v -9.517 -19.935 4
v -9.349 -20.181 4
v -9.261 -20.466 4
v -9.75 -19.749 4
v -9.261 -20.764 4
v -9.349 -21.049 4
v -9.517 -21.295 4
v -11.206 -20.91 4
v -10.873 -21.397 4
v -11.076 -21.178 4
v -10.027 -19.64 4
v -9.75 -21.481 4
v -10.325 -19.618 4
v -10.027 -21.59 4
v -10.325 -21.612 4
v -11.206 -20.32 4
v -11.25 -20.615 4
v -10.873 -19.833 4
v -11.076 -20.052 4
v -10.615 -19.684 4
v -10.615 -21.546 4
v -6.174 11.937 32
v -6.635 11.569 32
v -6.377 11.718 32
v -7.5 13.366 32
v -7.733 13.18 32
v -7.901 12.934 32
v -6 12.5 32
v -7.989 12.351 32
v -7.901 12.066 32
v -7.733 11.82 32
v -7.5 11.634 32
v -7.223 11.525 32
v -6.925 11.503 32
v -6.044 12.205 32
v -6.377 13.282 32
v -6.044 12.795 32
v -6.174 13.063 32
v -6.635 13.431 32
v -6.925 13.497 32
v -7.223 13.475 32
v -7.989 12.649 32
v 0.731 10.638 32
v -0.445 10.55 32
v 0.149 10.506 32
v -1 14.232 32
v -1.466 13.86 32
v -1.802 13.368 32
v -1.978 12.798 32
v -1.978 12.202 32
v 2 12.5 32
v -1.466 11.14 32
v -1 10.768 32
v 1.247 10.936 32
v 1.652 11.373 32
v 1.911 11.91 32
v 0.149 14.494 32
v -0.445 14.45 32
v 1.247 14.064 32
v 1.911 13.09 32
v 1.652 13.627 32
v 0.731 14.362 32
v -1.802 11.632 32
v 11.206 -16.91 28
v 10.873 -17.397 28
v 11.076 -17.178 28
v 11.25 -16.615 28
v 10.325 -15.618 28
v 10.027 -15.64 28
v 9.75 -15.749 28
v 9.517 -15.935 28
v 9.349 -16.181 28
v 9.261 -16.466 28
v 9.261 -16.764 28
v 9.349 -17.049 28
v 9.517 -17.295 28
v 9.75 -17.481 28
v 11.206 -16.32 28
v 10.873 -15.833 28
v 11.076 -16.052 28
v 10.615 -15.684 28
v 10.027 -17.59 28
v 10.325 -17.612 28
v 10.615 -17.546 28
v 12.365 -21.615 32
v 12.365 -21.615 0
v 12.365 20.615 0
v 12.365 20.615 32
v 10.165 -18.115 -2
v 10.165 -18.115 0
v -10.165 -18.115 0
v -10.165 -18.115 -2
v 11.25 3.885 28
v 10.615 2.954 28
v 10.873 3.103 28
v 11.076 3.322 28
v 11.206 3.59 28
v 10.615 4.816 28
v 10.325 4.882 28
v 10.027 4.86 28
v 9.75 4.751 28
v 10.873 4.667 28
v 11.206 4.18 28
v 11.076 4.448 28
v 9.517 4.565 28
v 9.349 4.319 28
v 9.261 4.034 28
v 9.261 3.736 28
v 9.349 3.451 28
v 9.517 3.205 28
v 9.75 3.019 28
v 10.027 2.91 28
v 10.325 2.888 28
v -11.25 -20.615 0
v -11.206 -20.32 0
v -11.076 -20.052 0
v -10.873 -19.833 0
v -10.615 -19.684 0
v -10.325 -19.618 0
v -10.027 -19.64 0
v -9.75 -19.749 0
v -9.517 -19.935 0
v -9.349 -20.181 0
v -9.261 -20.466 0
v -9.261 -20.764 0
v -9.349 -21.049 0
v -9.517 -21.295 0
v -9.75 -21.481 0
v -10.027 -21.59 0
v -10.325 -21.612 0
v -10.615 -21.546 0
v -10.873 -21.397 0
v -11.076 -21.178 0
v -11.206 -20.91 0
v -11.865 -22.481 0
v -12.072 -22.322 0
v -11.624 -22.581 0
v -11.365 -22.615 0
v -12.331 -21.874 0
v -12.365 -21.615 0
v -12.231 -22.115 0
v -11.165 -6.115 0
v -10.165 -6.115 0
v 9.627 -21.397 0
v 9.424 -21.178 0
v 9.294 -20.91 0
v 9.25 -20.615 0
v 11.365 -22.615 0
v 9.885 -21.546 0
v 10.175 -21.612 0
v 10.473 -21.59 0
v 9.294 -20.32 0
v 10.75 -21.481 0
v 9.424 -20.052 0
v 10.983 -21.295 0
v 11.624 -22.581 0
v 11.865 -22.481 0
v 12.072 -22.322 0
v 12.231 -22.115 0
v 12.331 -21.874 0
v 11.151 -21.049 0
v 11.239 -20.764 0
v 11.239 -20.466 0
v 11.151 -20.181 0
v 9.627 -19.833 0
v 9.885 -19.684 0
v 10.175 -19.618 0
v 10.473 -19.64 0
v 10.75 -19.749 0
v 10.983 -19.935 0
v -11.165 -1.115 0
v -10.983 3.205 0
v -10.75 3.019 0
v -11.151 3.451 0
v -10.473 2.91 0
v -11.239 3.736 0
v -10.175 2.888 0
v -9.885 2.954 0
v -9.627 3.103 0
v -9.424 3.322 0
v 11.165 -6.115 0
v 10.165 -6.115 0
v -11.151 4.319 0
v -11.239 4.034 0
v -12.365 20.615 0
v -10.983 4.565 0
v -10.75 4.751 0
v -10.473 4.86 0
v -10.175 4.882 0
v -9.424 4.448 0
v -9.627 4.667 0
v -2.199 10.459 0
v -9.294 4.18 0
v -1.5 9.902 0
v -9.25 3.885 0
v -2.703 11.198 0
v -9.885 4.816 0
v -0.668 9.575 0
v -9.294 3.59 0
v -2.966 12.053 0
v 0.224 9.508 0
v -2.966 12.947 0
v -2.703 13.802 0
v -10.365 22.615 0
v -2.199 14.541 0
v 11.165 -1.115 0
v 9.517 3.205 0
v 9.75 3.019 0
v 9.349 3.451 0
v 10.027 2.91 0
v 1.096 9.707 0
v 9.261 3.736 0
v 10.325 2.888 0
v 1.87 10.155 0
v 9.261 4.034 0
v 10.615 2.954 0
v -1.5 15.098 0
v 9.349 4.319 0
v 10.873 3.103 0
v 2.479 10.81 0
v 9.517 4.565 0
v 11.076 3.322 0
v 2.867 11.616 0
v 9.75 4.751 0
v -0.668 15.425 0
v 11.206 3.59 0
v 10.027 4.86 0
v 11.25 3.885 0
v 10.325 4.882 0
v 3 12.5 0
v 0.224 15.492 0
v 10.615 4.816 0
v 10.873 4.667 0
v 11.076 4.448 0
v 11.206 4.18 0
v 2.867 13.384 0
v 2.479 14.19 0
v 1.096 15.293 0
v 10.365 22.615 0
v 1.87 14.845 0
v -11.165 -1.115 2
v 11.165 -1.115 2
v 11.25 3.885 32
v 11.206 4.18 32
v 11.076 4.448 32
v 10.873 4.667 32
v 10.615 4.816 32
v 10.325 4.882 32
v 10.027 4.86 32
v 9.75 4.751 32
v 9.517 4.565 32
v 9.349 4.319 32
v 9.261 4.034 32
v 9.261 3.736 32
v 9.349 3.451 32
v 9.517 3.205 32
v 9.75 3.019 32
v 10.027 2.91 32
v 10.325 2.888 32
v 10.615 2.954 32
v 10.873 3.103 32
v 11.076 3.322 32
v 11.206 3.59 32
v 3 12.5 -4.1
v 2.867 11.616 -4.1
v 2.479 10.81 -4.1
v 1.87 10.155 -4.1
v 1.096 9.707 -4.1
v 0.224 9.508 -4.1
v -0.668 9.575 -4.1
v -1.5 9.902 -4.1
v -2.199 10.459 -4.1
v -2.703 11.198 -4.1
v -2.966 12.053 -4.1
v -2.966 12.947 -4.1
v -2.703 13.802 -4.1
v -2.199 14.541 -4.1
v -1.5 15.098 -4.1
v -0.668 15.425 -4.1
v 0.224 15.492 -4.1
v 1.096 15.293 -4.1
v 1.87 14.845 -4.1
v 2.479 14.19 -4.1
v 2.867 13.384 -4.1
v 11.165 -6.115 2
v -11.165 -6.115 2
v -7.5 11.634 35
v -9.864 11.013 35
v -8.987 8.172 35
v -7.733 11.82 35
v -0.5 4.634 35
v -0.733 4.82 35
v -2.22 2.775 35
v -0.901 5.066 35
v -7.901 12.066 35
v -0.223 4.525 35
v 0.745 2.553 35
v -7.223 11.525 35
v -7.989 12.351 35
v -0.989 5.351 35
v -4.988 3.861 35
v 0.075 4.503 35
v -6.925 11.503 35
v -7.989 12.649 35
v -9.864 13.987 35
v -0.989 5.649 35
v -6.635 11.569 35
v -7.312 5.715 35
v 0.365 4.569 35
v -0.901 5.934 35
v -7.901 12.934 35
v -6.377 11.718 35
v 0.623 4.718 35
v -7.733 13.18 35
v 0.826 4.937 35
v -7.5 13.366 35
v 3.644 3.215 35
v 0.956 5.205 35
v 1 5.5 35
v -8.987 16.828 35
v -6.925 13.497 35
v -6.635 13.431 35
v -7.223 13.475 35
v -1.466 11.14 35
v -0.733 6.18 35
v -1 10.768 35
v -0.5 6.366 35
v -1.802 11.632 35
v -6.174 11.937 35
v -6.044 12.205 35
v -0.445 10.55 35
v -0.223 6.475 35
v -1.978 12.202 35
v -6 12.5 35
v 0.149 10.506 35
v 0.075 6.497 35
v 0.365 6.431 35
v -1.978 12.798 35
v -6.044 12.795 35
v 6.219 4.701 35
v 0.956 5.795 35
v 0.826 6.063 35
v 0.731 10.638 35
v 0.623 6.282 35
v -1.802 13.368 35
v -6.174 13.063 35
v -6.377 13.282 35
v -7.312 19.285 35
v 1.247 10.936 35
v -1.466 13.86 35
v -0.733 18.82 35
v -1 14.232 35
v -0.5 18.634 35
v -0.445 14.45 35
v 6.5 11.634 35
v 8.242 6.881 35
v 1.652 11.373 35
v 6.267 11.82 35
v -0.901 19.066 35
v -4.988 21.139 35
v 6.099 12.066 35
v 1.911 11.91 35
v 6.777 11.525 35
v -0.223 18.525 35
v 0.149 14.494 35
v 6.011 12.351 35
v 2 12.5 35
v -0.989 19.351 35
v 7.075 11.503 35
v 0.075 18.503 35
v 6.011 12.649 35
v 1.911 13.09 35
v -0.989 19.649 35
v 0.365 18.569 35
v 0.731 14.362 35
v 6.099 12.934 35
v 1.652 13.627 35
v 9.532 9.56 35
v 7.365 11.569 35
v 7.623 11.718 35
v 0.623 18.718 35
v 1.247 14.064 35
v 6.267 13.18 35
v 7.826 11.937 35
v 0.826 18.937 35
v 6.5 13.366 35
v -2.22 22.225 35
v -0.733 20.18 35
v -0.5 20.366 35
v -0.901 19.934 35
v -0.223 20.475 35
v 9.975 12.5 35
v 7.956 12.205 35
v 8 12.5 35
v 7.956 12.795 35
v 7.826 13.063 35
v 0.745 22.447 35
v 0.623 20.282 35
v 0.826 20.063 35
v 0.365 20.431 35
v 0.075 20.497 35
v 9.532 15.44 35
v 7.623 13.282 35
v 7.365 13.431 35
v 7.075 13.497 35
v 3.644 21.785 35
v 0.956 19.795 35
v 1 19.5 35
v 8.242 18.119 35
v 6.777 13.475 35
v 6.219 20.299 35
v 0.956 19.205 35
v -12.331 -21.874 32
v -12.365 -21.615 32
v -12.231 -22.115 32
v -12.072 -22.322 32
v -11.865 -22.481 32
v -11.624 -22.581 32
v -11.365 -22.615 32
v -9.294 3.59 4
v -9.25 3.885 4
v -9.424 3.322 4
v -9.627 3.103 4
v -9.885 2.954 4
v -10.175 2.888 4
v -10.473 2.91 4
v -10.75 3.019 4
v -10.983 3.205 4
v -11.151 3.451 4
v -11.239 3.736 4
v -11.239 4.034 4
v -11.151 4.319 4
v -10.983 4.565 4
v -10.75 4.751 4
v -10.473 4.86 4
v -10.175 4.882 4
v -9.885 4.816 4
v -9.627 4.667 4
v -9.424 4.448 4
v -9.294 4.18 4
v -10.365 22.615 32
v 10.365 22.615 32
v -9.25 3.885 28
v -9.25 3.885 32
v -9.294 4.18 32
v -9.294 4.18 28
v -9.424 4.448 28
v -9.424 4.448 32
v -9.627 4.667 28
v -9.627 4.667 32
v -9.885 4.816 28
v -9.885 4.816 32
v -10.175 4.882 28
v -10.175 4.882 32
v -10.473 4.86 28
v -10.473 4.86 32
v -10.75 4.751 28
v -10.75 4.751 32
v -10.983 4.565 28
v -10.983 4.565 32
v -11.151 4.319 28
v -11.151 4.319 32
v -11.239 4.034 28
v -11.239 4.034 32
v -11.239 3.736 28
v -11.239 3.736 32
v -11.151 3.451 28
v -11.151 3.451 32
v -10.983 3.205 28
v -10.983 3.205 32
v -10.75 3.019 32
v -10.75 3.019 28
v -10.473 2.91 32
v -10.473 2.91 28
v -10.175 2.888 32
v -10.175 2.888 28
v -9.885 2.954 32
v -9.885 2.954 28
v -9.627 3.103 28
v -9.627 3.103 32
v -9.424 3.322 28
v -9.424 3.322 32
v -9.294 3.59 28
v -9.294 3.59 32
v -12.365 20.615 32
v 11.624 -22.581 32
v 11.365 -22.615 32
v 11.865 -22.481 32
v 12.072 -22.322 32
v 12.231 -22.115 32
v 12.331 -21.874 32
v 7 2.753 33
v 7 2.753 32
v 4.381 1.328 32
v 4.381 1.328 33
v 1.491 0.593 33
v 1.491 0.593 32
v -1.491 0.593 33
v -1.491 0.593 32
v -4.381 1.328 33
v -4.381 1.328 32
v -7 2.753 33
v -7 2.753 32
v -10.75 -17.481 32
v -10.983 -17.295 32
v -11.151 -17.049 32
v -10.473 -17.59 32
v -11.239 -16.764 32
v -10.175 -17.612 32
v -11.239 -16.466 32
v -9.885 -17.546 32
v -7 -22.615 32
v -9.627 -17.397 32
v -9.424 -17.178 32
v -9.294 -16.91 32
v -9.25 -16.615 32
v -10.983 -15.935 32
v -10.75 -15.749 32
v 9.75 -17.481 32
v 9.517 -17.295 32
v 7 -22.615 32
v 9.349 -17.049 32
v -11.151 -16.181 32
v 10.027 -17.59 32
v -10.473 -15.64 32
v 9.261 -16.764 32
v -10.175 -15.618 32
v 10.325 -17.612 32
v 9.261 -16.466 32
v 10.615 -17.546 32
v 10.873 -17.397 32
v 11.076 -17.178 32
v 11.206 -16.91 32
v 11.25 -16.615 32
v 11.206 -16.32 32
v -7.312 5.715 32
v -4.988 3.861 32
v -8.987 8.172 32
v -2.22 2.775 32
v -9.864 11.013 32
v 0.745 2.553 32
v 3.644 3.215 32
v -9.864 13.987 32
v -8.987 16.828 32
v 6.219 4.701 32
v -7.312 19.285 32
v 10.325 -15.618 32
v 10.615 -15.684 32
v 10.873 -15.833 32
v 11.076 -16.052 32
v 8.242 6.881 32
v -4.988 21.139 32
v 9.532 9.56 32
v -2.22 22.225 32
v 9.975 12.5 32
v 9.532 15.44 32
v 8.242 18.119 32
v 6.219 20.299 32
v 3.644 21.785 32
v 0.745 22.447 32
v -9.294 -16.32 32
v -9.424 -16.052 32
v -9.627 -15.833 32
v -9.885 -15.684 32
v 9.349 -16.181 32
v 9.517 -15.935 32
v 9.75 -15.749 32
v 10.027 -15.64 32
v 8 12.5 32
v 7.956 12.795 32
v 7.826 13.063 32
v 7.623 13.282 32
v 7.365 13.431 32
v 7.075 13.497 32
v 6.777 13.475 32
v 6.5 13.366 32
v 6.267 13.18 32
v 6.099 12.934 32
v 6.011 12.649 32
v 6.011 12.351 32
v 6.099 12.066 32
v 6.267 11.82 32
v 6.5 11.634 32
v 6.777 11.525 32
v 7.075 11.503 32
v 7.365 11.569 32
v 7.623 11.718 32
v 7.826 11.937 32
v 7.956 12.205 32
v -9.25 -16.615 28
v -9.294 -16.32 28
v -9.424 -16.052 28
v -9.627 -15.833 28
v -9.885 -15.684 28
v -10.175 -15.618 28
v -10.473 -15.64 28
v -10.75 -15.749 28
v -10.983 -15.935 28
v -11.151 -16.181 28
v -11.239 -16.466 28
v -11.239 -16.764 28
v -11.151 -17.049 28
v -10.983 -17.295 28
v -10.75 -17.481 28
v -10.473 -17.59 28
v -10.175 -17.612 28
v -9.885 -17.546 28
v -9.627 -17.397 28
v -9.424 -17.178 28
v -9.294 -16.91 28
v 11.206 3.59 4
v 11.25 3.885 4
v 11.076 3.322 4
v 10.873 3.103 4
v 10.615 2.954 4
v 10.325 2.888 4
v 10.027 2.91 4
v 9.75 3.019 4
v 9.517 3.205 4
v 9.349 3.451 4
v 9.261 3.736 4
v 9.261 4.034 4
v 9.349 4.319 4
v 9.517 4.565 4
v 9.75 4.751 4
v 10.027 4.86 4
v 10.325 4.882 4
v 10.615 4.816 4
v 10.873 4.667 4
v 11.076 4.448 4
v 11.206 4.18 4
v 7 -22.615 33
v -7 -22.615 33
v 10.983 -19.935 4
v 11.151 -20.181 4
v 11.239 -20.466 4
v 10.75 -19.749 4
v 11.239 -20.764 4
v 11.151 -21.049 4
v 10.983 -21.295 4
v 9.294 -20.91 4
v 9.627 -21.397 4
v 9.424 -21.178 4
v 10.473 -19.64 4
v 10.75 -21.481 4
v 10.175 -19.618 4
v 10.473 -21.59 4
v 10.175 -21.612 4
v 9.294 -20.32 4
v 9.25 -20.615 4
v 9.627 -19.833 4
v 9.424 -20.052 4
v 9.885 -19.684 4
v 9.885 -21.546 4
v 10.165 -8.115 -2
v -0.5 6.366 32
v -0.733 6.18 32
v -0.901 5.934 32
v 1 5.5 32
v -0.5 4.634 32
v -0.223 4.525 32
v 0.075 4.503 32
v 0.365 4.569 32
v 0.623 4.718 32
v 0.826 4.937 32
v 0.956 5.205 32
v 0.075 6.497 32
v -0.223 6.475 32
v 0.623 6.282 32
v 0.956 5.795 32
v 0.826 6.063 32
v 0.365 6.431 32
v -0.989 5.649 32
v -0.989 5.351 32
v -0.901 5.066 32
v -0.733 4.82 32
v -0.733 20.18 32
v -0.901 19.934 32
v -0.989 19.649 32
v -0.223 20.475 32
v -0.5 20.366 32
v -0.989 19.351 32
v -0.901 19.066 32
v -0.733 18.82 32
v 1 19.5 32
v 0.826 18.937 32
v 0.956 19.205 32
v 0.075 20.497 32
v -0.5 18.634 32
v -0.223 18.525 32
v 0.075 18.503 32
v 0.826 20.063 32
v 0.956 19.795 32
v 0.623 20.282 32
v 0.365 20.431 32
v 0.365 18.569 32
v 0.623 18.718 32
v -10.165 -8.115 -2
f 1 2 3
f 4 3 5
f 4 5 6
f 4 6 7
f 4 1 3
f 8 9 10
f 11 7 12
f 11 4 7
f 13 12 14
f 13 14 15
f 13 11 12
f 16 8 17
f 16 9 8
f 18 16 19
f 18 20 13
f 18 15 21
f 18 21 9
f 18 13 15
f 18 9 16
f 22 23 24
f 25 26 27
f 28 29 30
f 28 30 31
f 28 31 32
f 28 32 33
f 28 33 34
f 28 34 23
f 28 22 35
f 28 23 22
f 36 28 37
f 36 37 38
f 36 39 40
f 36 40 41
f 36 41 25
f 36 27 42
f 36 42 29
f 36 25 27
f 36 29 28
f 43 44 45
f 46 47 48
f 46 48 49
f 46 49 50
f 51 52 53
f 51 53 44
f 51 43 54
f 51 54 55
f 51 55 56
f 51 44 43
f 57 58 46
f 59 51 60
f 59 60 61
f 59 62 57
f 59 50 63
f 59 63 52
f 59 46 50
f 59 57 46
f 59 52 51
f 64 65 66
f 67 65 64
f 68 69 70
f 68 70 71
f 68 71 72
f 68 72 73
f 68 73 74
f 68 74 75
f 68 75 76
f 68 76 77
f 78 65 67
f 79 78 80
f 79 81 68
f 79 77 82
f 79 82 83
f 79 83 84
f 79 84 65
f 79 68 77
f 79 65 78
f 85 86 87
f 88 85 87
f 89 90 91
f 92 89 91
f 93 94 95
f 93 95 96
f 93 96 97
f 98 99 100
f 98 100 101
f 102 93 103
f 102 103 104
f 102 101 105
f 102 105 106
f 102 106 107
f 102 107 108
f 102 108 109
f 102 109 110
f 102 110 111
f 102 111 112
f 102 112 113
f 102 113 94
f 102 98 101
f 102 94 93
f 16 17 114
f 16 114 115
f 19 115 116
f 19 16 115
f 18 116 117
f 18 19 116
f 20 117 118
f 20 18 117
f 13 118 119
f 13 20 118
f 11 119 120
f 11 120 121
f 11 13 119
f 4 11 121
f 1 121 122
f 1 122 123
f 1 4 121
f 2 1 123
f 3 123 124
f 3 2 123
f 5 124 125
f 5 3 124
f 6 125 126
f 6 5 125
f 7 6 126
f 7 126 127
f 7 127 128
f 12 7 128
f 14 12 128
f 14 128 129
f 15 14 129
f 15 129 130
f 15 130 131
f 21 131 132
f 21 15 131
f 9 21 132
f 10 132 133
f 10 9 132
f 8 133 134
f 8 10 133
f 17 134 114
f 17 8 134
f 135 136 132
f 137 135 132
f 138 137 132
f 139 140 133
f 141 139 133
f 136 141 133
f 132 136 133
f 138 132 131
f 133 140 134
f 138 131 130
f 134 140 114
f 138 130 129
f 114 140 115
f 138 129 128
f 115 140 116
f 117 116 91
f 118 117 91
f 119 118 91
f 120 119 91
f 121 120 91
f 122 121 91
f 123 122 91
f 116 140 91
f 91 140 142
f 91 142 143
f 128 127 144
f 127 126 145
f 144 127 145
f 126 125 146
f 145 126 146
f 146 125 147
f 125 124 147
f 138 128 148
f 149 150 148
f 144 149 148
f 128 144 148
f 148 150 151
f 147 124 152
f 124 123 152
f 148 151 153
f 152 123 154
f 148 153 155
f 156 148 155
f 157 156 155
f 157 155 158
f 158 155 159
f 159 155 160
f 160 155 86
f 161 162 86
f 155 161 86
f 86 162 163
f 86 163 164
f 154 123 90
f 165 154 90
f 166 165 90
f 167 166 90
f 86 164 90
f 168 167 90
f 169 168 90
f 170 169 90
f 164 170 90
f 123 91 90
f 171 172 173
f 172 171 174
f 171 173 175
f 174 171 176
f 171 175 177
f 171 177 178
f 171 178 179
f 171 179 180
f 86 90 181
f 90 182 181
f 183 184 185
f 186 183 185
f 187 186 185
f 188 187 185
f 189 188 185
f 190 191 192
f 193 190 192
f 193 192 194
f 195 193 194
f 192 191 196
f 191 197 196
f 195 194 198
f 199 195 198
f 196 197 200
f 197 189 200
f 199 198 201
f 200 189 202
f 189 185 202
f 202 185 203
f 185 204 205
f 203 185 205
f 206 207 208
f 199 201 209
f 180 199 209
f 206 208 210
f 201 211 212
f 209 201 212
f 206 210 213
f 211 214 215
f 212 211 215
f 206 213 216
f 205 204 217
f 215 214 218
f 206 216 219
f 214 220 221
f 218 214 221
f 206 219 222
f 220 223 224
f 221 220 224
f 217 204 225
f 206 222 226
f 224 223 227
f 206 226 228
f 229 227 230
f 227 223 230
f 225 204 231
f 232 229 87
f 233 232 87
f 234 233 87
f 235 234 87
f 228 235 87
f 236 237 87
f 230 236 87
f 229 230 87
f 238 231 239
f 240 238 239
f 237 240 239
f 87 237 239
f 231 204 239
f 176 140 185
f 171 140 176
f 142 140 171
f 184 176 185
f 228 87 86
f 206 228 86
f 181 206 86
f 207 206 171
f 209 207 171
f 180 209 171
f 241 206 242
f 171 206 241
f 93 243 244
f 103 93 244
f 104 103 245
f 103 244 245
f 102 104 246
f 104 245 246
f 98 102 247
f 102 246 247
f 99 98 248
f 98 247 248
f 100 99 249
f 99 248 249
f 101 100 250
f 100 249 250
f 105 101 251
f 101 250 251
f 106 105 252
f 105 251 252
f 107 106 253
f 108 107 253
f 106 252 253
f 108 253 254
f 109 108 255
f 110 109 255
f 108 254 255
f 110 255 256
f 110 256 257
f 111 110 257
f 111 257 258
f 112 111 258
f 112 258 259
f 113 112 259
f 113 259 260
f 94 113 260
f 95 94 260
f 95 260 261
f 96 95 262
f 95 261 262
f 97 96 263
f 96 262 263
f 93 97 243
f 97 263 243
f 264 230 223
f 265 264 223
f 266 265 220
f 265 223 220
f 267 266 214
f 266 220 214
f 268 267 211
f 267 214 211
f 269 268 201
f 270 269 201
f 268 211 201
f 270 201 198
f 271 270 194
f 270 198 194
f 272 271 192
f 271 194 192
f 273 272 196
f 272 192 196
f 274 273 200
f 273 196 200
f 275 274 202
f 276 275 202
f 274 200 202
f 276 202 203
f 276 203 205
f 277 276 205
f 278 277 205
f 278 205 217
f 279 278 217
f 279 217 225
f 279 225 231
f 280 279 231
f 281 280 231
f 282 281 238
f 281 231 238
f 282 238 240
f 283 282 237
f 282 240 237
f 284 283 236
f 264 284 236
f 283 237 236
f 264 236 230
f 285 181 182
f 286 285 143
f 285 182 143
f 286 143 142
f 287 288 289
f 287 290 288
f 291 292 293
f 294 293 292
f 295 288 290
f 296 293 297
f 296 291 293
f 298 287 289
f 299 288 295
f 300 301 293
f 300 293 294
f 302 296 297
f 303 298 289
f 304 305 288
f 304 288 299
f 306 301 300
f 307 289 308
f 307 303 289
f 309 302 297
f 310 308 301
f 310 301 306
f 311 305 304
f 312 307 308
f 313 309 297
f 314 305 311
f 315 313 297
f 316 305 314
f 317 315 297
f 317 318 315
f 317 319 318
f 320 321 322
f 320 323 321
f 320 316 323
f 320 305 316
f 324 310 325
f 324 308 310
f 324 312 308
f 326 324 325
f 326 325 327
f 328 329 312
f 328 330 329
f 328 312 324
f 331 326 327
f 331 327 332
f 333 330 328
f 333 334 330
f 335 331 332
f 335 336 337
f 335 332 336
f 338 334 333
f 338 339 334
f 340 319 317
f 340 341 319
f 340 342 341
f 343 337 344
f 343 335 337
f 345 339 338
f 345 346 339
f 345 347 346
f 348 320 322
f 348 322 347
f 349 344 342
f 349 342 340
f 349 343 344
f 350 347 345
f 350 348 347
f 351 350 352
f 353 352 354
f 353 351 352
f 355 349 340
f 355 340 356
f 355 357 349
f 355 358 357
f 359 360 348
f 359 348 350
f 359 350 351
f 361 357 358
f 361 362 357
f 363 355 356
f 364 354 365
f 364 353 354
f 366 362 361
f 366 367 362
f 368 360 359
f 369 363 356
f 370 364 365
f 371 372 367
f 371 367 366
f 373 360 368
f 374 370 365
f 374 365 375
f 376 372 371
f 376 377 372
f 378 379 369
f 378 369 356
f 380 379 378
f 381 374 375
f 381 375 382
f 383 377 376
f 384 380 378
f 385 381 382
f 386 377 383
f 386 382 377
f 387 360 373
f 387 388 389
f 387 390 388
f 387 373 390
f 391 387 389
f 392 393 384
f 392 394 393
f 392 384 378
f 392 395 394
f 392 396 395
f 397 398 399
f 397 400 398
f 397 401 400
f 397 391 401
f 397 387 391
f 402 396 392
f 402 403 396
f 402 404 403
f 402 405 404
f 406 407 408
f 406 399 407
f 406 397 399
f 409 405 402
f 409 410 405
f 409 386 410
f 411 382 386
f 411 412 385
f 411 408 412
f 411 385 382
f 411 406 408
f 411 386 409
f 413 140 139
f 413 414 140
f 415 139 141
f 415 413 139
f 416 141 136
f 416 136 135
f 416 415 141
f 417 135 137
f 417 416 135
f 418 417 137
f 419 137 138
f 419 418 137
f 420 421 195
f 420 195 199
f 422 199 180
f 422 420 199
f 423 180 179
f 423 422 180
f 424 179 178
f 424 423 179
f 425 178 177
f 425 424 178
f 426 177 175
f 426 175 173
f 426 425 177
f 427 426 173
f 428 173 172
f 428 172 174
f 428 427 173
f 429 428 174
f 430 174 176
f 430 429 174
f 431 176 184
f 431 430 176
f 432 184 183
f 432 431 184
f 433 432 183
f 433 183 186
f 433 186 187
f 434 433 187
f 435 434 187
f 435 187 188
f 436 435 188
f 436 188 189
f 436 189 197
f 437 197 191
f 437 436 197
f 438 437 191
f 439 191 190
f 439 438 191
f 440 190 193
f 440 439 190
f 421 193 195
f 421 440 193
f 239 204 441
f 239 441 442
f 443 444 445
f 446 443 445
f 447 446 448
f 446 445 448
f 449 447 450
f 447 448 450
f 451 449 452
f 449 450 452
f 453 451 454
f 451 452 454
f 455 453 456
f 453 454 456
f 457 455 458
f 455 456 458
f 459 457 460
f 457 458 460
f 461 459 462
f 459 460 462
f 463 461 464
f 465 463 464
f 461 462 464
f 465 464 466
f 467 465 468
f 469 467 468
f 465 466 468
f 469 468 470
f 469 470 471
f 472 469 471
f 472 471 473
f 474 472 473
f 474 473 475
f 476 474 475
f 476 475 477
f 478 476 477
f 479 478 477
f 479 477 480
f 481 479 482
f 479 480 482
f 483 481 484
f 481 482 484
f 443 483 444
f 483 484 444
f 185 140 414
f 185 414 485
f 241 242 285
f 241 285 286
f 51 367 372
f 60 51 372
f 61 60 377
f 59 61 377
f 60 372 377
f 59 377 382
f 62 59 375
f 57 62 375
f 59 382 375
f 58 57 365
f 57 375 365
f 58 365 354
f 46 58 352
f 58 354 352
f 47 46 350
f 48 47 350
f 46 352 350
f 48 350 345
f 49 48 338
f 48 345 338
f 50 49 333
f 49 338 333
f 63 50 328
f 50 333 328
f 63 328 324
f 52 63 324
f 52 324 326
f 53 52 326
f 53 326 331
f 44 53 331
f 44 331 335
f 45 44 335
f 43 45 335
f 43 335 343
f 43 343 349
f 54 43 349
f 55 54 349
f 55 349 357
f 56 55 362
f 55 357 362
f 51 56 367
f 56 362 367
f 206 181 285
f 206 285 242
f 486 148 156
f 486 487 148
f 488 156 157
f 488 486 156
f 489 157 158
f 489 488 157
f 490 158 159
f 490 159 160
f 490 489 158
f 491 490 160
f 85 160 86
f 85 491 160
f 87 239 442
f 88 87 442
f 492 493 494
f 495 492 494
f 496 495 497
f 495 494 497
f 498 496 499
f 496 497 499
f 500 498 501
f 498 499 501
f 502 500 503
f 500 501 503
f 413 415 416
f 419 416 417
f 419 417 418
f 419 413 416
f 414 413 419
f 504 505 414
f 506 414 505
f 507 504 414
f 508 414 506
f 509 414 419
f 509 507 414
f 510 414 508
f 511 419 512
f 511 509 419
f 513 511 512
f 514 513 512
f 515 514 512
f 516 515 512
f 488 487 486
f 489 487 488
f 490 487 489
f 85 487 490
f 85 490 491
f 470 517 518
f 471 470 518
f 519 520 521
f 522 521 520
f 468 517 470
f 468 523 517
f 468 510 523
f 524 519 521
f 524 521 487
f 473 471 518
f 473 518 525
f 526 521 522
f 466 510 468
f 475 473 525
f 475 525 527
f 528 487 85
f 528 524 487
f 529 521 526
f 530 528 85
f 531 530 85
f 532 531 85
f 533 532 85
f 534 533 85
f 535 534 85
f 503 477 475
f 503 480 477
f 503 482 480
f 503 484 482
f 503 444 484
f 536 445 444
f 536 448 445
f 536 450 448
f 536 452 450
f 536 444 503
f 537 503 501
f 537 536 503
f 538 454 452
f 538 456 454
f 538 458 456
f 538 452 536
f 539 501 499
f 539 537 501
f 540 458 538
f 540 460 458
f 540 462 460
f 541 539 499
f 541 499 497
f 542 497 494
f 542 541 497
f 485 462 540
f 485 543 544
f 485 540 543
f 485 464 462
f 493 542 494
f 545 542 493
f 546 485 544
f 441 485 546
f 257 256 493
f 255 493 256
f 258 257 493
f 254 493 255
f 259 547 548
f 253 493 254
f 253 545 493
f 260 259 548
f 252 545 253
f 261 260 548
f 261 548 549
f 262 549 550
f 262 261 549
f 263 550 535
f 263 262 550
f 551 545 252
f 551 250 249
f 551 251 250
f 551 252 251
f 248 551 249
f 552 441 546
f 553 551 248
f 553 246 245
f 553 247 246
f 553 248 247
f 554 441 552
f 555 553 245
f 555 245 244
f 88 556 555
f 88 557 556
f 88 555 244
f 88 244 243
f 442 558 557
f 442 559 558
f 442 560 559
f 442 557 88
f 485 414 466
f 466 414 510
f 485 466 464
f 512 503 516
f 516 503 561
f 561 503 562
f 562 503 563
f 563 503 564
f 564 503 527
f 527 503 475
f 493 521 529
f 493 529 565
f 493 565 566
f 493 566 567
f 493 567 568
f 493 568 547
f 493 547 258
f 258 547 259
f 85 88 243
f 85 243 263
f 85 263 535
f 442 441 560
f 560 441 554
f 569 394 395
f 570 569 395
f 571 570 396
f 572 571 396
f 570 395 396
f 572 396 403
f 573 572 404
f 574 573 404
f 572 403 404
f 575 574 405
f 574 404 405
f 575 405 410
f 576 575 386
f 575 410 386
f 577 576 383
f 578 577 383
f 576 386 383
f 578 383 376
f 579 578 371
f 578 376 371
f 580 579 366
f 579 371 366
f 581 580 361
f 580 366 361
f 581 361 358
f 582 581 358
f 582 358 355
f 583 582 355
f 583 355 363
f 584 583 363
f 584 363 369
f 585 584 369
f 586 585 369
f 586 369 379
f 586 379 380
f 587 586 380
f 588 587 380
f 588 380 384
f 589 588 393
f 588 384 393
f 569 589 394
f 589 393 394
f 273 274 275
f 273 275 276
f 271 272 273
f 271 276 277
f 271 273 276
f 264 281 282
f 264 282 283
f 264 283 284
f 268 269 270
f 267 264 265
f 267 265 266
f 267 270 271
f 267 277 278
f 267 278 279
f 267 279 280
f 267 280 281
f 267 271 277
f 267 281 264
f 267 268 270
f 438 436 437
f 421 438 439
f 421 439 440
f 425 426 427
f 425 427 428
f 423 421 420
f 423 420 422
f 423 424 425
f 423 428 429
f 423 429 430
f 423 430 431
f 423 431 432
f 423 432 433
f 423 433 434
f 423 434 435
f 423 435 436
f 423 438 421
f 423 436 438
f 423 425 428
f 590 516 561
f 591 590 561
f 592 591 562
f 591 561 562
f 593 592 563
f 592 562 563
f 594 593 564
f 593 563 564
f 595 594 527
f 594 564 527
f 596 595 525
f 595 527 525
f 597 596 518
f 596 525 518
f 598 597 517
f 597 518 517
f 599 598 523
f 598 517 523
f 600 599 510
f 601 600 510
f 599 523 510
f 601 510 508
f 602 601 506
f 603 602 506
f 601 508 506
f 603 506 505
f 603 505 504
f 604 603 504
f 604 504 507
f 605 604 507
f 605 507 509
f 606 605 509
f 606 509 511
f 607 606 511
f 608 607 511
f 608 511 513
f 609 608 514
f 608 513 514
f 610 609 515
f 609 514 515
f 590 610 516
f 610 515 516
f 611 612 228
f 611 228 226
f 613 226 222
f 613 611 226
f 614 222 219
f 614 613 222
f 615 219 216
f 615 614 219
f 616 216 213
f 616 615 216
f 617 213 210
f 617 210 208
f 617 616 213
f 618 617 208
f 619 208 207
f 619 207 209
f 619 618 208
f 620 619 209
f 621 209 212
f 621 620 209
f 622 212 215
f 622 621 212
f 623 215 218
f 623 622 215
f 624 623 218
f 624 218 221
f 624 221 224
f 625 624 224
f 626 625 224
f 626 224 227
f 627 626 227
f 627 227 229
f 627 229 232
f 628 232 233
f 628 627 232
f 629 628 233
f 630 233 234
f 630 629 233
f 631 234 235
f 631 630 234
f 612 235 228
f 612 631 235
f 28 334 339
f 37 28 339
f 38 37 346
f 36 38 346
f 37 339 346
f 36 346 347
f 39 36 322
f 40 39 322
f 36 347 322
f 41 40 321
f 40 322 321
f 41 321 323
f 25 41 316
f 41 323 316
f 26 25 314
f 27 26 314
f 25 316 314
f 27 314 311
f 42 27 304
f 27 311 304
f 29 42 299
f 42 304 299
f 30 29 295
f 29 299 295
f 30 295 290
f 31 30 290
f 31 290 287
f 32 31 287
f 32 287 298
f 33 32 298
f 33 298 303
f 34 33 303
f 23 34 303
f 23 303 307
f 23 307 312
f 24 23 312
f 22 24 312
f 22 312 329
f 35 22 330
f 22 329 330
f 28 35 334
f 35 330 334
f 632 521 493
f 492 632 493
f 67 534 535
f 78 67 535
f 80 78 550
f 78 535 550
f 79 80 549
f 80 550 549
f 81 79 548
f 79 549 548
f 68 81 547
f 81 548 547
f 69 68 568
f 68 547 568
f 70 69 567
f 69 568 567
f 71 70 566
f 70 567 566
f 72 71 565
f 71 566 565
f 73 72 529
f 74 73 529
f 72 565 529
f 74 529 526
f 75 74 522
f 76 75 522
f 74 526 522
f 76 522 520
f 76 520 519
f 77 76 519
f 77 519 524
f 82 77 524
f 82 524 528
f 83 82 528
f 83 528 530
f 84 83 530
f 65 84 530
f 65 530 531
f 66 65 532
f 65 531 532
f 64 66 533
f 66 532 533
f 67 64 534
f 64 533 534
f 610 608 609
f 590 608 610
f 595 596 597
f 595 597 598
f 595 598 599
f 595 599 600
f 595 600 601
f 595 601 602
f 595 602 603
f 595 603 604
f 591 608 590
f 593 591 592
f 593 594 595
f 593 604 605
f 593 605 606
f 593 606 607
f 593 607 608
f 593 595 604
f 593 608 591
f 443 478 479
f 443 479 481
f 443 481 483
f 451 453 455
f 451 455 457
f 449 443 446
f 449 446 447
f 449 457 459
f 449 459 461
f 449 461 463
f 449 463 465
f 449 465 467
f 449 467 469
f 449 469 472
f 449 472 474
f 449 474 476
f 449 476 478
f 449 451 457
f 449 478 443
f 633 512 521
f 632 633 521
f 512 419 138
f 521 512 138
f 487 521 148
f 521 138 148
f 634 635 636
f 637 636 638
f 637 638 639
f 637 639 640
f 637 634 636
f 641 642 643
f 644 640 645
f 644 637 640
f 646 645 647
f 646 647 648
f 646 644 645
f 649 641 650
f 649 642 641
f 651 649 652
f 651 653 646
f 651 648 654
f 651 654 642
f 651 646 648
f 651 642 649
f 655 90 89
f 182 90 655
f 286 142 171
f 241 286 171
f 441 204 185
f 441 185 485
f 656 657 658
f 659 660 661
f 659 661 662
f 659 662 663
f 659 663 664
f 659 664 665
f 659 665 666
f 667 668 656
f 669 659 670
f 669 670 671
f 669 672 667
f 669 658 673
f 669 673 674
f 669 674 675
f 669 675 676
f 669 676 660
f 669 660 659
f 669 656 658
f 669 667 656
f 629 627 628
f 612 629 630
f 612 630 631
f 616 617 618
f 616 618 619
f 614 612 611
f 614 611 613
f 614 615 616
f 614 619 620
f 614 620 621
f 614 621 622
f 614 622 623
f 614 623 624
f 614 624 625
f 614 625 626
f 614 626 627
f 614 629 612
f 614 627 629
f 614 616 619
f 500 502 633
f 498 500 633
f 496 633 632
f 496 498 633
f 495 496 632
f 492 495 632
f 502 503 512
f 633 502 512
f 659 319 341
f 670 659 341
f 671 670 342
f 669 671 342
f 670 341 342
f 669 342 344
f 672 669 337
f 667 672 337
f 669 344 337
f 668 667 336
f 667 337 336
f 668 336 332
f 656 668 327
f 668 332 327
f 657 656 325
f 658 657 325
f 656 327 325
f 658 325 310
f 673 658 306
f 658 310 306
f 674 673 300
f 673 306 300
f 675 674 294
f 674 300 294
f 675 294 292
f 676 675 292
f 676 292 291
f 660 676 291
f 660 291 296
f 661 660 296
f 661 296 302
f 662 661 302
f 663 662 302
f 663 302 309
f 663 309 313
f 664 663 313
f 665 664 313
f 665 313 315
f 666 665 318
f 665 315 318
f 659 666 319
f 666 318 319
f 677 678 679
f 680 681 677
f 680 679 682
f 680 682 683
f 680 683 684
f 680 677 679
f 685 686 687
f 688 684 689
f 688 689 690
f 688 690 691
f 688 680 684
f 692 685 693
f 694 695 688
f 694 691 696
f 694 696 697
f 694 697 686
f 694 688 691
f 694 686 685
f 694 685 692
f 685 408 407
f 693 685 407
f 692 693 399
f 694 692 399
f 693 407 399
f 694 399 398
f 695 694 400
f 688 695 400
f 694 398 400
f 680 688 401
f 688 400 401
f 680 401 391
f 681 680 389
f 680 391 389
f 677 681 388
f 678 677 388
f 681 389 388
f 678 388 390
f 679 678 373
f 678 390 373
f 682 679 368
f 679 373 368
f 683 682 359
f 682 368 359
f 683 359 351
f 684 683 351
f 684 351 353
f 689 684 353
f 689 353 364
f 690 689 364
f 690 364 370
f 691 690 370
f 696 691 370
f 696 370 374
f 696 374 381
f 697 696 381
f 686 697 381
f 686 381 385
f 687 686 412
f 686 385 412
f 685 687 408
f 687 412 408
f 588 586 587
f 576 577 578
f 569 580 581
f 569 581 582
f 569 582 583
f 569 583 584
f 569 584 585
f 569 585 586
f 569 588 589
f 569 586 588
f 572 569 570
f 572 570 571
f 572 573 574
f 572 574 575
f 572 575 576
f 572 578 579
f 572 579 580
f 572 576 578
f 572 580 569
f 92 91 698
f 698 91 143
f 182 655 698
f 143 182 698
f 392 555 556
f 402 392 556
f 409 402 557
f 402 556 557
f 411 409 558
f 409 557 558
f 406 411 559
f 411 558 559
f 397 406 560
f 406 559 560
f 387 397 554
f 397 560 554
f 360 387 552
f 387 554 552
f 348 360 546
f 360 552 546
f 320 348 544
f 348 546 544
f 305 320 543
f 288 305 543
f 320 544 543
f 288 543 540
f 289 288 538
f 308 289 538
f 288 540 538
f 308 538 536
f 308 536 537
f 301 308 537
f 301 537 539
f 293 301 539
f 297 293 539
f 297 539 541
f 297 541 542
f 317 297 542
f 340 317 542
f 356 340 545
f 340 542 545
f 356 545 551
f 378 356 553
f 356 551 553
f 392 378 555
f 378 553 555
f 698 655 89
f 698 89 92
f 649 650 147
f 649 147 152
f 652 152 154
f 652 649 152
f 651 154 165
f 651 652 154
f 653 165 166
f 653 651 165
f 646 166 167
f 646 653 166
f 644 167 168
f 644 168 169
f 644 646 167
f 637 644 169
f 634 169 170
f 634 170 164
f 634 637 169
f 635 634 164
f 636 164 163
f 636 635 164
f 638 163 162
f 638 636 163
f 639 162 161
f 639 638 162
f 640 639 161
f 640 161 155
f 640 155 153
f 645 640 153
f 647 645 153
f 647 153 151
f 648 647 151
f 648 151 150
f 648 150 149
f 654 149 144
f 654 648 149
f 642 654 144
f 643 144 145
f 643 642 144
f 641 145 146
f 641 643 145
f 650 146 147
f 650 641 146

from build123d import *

# Parameters (mm, degrees)
SKETCH_1_W          = 24.73
SKETCH_1_H          = 45.23
EXTRUDE_1_DEPTH     = 32
CHAMFER_1_SIZE      = 2
EXTRUDE_2_DEPTH     = 1
SKETCH_3_R          = 1
CUT_EXTRUDE_1_DEPTH = 4
SKETCH_4_R          = 9.975
EXTRUDE_3_DEPTH     = 3
SKETCH_5_R          = 2
SKETCH_5_R_2        = 1
CUT_EXTRUDE_2_DEPTH = 3
SKETCH_6_W          = 20.33
SKETCH_6_H          = 12
EXTRUDE_4_DEPTH     = 2
CHAMFER_2_SIZE      = 2
SKETCH_7_W          = 22.33
SKETCH_7_H          = 5
CUT_EXTRUDE_3_DEPTH = 2
SKETCH_8_R          = 3
EXTRUDE_5_DEPTH     = 4.1
CUT_EXTRUDE_START   = -4
SKETCH_9_R          = 1
CUT_EXTRUDE_4_DEPTH = 4
FILLET_1_R          = 1


with BuildPart() as part:
    # 스케치1 → 보스-돌출1 (new body)
    with BuildSketch(Plane.XY):
        Rectangle(SKETCH_1_W, SKETCH_1_H)
    extrude(amount=EXTRUDE_1_DEPTH)

    # 모따기1
    chamfer_1_edges = [part.edges().sort_by_distance(p)[0] for p in [
        (-12.365, 22.615, 16),
        (12.365, 22.615, 16),
    ]]
    chamfer(chamfer_1_edges, length=CHAMFER_1_SIZE)

    # 스케치2 → 보스-돌출2 (add)
    with BuildSketch(Plane.XY.offset(32)):
        with BuildLine():
            Line((-7, -22.615), (7, -22.615))
            Line((7, -22.615), (7, 2.753205655))
            ThreePointArc((7, 2.753205655), (0, 0.5), (-7, 2.753205655))
            Line((-7, 2.753205655), (-7, -22.615))
        make_face()
    extrude(amount=EXTRUDE_2_DEPTH)

    # 스케치3 → 컷-돌출1 (cut)
    with BuildSketch(Plane.XY.offset(32)):
        with Locations((-10.25, 3.885)):
            Circle(SKETCH_3_R)
        with Locations((-10.25, -16.615)):
            Circle(SKETCH_3_R)
        with Locations((10.25, -16.615)):
            Circle(SKETCH_3_R)
        with Locations((10.25, 3.885)):
            Circle(SKETCH_3_R)
    extrude(amount=-CUT_EXTRUDE_1_DEPTH, mode=Mode.SUBTRACT)

    # 스케치4 → 보스-돌출3 (add)
    with BuildSketch(Plane.XY.offset(32)):
        with Locations((0, 12.5)):
            Circle(SKETCH_4_R)
    extrude(amount=EXTRUDE_3_DEPTH)

    # 스케치5 → 컷-돌출2 (cut)
    with BuildSketch(Plane.XY.offset(35)):
        with Locations((0, 12.5)):
            Circle(SKETCH_5_R)
        with Locations((0, 19.5)):
            Circle(SKETCH_5_R_2)
        with Locations((7, 12.5)):
            Circle(SKETCH_5_R_2)
        with Locations((0, 5.5)):
            Circle(SKETCH_5_R_2)
        with Locations((-7, 12.5)):
            Circle(SKETCH_5_R_2)
    extrude(amount=-CUT_EXTRUDE_2_DEPTH, mode=Mode.SUBTRACT)

    # 스케치6 → 보스-돌출4 (add)
    with BuildSketch(Plane(origin=(0, 0, 0), x_dir=(-1, 0, 0), z_dir=(0, 0, -1))):
        with Locations((0, -12.115)):
            Rectangle(SKETCH_6_W, SKETCH_6_H)
    extrude(amount=EXTRUDE_4_DEPTH)

    # 모따기2
    chamfer_2_edges = [part.edges().sort_by_distance(p)[0] for p in [
        (0, -6.115, -2),
    ]]
    chamfer(chamfer_2_edges, length=CHAMFER_2_SIZE - 0.0001)  # a hair under: the kernel refuses the full size

    # 스케치7 → 컷-돌출3 (cut)
    with BuildSketch(Plane(origin=(0, 0, 0), x_dir=(-1, 0, 0), z_dir=(0, 0, -1))):
        with Locations((0, -3.615)):
            Rectangle(SKETCH_7_W, SKETCH_7_H)
    extrude(amount=-CUT_EXTRUDE_3_DEPTH, mode=Mode.SUBTRACT)

    # 스케치8 → 보스-돌출5 (add)
    with BuildSketch(Plane(origin=(0, 0, 0), x_dir=(-1, 0, 0), z_dir=(0, 0, -1))):
        with Locations(Location((0, 12.5, 0), (0, 0, 180))):
            Circle(SKETCH_8_R)
    extrude(amount=EXTRUDE_5_DEPTH)

    # 스케치9 → 컷-돌출4 (cut)
    with BuildSketch(Plane(origin=(0, 0, 0), x_dir=(-1, 0, 0), z_dir=(0, 0, -1)).offset(CUT_EXTRUDE_START)):
        with Locations(Location((-10.25, 3.885, 0), (0, 0, 180))):
            Circle(SKETCH_9_R)
        with Locations(Location((10.25, 3.885, 0), (0, 0, 180))):
            Circle(SKETCH_9_R)
        with Locations((-10.25, -20.615)):
            Circle(SKETCH_9_R)
        with Locations((10.25, -20.615)):
            Circle(SKETCH_9_R)
    extrude(amount=CUT_EXTRUDE_4_DEPTH, mode=Mode.SUBTRACT)

    # 필렛1
    fillet_1_edges = [part.edges().sort_by_distance(p)[0] for p in [
        (12.365, -22.615, 16),
        (-12.365, -22.615, 16),
    ]]
    fillet(fillet_1_edges, radius=FILLET_1_R)


solid = part.part
